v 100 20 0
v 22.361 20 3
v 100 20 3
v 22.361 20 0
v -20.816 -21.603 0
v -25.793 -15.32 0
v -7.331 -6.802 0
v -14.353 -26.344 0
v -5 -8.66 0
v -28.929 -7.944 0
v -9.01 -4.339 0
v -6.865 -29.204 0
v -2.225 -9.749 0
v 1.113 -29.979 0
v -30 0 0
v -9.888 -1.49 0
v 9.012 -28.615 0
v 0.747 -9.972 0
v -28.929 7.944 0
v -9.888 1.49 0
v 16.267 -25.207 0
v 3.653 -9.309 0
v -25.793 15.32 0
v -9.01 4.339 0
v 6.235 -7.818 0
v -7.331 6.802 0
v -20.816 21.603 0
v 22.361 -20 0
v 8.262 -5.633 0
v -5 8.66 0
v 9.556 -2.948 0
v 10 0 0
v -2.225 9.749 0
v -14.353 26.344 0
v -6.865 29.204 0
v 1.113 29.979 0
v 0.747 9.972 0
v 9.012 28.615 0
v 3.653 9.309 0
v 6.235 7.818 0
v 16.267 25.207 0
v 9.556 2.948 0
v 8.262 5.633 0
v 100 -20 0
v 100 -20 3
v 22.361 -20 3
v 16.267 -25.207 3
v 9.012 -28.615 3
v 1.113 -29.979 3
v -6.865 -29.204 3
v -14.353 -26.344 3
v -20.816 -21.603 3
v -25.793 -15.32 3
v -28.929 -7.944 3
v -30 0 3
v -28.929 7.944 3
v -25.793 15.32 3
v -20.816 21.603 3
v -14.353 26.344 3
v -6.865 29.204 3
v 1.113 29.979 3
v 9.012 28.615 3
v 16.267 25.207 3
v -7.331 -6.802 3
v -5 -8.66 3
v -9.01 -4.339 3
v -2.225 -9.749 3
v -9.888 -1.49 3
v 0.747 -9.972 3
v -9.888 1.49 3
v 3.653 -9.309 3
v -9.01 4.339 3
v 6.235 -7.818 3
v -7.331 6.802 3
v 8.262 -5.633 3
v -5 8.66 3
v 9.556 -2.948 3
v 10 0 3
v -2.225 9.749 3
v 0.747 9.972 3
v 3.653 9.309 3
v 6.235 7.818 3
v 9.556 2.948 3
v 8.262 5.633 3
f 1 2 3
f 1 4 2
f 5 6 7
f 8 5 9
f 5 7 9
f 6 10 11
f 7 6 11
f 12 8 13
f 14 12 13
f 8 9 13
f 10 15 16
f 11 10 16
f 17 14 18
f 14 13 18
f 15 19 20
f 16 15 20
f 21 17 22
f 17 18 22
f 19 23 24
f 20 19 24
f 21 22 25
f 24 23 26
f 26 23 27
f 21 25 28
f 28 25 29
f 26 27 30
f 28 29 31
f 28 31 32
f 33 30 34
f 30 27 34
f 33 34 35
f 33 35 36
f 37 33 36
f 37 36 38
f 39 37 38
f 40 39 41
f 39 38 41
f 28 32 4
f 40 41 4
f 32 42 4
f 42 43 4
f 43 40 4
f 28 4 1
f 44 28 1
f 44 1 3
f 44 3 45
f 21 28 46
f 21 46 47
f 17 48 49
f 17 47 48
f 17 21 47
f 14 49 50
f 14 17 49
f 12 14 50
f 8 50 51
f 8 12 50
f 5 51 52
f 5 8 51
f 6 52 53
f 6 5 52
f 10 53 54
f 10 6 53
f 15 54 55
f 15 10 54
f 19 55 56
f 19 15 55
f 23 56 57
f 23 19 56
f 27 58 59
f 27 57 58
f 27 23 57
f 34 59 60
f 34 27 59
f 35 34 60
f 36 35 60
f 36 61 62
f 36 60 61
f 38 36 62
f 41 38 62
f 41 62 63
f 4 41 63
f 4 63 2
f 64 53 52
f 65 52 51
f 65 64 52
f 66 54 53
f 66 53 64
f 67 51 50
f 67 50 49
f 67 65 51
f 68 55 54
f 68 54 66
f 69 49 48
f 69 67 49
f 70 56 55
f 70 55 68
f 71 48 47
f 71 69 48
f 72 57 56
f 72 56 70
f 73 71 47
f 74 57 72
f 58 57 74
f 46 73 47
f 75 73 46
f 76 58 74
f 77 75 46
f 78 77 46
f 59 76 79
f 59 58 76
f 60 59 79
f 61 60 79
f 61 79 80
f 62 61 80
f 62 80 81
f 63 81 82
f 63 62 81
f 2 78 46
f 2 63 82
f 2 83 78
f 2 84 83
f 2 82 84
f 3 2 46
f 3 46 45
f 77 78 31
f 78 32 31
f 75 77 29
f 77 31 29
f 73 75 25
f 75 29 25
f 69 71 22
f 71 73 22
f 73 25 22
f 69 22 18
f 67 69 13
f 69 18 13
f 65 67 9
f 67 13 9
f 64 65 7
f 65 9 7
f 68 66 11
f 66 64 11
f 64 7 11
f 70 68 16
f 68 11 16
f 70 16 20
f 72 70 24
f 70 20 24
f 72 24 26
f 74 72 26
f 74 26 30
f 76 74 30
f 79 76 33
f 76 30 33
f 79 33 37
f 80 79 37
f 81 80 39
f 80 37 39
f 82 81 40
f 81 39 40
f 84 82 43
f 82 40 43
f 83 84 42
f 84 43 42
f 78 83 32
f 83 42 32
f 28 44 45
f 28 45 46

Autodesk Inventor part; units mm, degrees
ref_plane "YZ Plane" through (0, 0, 0) normal (1, 0, 0) x (0, 1, 0)
ref_plane "XZ Plane" through (0, 0, 0) normal (0, 1, 0) x (-1, 0, 0)
ref_plane "XY Plane" through (0, 0, 0) normal (0, 0, 1) x (1, 0, 0)
sketch "Эскиз3" plane through (0, 0, 0) normal (0, 0, 1) x (1, 0, 0)
  circle A0 centre (0, 0) radius 10
  arc A1 (22.3607, 20) -> (22.3607, -20) centre (0, 0) ccw
  line L0 (22.3607, 20) -> (100, 20)
  line L1 (100, 20) -> (100, -20)
  line L2 (100, -20) -> (22.3607, -20)
  line L3 (22.3607, -20) -> (22.3607, 20)
  dimension "d8" = 20
  dimension "d9" = 60
  dimension "d10" = 100
  dimension "d11" = 40
extrude "Выдавливание3" add sketch "Эскиз3" along normal blind 3
equation "\"d8\" = d_main_shaft"
equation "\"d10\" = length_coxa"
equation "\"d11\" = hight_coxa"
equation "\"d6\" = thickness_steel"
equation "\"tolerance_plazma\" = 0.1"
equation "\"thickness_steel\" = 3"
equation "\"d_main_screw_holes\" = 6.1"
equation "\"d_main_shaft\" = 20"
equation "\"thickness_profile_tibea\" = 3"
equation "\"hight_shaft_shift\" = 37"
equation "\"thickness_profile_femur\" = 3"
equation "\"width_shaft_shift\" = 35"
equation "\"width_flattened_surface\" = 12"
equation "\"length_coxa\" = 100"
equation "\"hight_coxa\" = 40"
properties part number "coxa_support_steel" material "Сталь"
